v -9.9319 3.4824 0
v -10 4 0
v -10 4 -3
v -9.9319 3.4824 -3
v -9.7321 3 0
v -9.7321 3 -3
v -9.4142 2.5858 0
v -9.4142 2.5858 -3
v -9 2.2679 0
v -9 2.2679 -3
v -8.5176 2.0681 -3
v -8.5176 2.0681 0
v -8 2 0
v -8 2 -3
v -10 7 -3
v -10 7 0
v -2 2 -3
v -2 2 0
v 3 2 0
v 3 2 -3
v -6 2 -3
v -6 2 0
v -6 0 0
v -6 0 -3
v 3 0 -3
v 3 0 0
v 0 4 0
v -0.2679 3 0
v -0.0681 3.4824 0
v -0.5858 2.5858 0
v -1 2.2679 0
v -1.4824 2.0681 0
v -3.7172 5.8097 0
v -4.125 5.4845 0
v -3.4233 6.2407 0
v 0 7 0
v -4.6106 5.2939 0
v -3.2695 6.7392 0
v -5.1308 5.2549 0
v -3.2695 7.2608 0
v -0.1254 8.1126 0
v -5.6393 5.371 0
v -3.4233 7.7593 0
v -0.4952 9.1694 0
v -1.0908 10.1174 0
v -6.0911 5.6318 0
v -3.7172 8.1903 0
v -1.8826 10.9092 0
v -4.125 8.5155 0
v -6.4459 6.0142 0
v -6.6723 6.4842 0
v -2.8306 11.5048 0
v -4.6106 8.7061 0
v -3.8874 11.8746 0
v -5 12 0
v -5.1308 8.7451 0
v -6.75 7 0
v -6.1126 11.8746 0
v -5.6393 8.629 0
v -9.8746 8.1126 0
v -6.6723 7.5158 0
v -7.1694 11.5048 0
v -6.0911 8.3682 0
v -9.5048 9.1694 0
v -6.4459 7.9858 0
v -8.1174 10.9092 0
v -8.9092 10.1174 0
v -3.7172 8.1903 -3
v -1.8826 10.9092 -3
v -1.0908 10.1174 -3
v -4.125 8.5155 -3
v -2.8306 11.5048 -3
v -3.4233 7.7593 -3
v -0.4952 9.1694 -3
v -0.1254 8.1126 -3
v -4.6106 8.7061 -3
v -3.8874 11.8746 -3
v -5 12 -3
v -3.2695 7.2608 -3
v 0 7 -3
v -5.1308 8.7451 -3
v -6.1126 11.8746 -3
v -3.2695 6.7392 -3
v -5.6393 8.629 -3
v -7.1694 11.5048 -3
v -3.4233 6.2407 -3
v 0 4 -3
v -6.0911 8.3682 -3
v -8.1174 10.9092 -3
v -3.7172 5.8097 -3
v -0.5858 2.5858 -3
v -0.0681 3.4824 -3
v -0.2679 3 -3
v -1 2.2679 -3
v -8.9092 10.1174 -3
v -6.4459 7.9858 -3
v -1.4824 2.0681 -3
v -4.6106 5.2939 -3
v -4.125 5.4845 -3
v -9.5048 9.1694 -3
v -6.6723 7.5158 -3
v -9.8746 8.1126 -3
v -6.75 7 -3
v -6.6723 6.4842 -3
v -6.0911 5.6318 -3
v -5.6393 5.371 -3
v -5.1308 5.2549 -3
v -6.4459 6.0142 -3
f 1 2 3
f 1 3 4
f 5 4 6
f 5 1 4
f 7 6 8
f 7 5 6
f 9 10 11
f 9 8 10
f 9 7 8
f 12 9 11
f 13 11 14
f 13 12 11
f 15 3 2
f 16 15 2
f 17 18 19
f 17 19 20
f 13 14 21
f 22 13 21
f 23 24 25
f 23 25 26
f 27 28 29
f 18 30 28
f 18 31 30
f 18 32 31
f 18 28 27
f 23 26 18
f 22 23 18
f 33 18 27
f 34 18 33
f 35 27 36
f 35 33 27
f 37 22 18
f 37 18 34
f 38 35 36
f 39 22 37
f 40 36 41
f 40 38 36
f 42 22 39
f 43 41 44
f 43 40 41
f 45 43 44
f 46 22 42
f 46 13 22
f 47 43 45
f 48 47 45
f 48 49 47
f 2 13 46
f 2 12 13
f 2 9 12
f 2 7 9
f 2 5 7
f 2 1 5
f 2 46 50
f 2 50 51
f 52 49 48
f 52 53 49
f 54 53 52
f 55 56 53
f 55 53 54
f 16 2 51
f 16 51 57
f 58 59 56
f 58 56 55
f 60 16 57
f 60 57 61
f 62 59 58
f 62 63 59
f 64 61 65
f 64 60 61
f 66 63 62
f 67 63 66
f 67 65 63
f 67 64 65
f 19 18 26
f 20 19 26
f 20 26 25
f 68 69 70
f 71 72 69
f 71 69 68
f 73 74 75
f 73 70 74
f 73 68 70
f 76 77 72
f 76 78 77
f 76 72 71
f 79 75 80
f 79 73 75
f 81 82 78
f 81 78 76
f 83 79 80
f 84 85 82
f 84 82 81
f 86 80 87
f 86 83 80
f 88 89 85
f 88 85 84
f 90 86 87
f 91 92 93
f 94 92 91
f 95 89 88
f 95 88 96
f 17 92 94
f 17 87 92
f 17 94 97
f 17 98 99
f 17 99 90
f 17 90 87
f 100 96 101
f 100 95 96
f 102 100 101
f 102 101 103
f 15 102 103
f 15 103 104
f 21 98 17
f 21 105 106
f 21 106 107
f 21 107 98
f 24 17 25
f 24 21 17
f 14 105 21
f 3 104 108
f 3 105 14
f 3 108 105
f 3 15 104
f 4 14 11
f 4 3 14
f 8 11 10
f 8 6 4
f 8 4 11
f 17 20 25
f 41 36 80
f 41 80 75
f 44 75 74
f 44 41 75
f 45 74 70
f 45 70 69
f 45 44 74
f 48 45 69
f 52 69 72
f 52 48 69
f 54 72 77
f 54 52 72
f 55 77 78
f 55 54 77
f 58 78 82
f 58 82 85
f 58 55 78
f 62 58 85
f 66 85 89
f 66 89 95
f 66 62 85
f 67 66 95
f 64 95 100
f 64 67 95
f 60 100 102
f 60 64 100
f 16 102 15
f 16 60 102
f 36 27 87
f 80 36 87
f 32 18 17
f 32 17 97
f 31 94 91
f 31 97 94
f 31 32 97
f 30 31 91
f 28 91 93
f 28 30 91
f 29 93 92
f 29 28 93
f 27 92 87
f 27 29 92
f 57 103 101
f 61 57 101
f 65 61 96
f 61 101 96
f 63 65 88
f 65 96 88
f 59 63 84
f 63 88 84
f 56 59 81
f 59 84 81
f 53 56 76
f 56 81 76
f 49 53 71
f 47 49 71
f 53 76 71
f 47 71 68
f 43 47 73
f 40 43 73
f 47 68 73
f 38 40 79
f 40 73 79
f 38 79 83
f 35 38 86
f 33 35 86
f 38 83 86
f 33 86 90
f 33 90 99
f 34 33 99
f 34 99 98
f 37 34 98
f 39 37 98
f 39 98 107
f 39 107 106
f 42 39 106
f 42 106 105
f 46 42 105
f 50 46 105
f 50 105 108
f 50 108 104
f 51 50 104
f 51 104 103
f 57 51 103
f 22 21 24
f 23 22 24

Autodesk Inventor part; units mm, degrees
ref_plane "YZ Plane" through (0, 0, 0) normal (1, 0, 0) x (0, 1, 0)
ref_plane "XZ Plane" through (0, 0, 0) normal (0, 1, 0) x (-1, 0, 0)
ref_plane "XY Plane" through (0, 0, 0) normal (0, 0, 1) x (1, 0, 0)
sketch "Sketch1" plane through (0, 0, 0) normal (0, 1, 0) x (-1, 0, 0)
  line L0 (0, 0) -> (0, -3)
  line L1 (0, -3) -> (10, -3)
  line L2 (10, -3) -> (10, 0)
  line L3 (10, 0) -> (0, 0)
  dimension "d0" = 3
  dimension "d1" = 10
  dimension "d2" = 90
  dimension "d3" = 3
extrude "Extrusion1" add sketch "Sketch1" along normal blind 12
sketch "Sketch4" plane through (0, 0, -3) normal (0, 0, -1) x (-1, 0, 0)
  line L0 (0, 0) -> (0, 2)
  line L1 (0, 0) -> (0, 12) projected
  line L2 (0, 2) -> (4, 2)
  line L3 (10, 0) -> (10, 12) projected
  line L4 (4, 2) -> (0, 0)
  line L5 (0, 0) -> (10, 0) projected
  line L6 (10, 0) -> (10, 2)
  line L7 (10, 2) -> (6, 2)
  line L8 (6, 2) -> (10, 0)
  line L9 (4, 2) -> (6, 2)
  line L10 (6, 2) -> (6, 0)
  line L11 (4, 2) -> (4, 0)
  line L12 (4, 0) -> (6, 0)
  dimension "d9" = 2
  dimension "d10" = 4
  dimension "d11" = 2
  dimension "d12" = 4
extrude "Extrusion3" cut sketch "Sketch4" against normal up to surface (3 mm away) contours L0 L2 L4 | L4 L11 L5 | L7 L3 L8 | L8 L5 L10
sketch "Sketch6" plane through (0, 12, -3) normal (0, 0, -1) x (-1, 0, 0)
  line L0 (0, -10) -> (0, 0) projected
  line L1 (0, -5) -> (10, -5)
  line L2 (10, -10) -> (10, 0) projected
  line L3 (0, 0) -> (10, 0) projected
  line L4 (5, 0) -> (5, -10)
  circle A0 centre (5, -5) radius 1.75
  point P0 (0, -12)
  dimension "d15" = 3.5
extrude "Extrusion4" cut sketch "Sketch6" against normal up to surface (3 mm away) contours A0 L4 L1 | L1 L4 A0 | L4 A0 L1 | L1 A0 L4
fillet "Fillet1" radius 2 4 edges at (0, 12, -1.5) (0, 2, -1.5) (-10, 12, -1.5) (-10, 2, -1.5)
sketch "Sketch7" plane through (-8, 12, 0) normal (0, 0, 1) x (1, 0, 0)
  circle A0 centre (3, -5) radius 1.75 projected
  arc A1 (8, -2) -> (6, 0) centre (6, -2) ccw projected
  circle A2 centre (3, -5) radius 5
  line L0 (6, 0) -> (0, 0) projected
  line L1 (2, -12) -> (4, -12) projected
  line L2 (4, -10) -> (6, -10) projected
  arc A3 (6, -10) -> (8, -8) centre (6, -8) ccw projected
  line L3 (8, -8) -> (8, -2) projected
  arc A4 (8, -2) -> (6, 0) centre (6, -2) ccw projected
  line L4 (0, 0) -> (6, 0) projected
  arc A5 (0, 0) -> (-2, -2) centre (0, -2) ccw projected
  line L5 (-2, -8) -> (-2, -2) projected
  arc A6 (-2, -8) -> (0, -10) centre (0, -8) ccw projected
  line L6 (0, -10) -> (2, -10) projected
  circle A7 centre (3, -5) radius 1.75 projected
  line L7 (2, -10) -> (2, -12) projected
  line L8 (4, -12) -> (4, -10) projected
  point P0 (8, -12)
  point P1 (-2, -5)
  point P2 (3, 0)
  point P3 (8, -5)
  point P4 (8, -2)
extrude "Extrusion5" cut sketch "Sketch7" against normal up to surface (3 mm away) contours L3 A2 L0 A1 | A2 L5 A5 L0
sketch "Sketch8" plane through (-4, 0, -3) normal (1, 0, 0) x (0, 0, -1)
  line L0 (0, 2) -> (0, 0) projected
  line L1 (-3, 0) -> (-3, 2) projected
  line L2 (0, 0) -> (-3, 0)
  line L3 (-3, 0) -> (-3, 2)
  line L4 (-3, 2) -> (0, 2)
  line L5 (0, 2) -> (0, 0)
extrude "Extrusion6" add sketch "Sketch8" along normal blind 7
properties part number "Knuckle Attachment SMALL HOLE"
